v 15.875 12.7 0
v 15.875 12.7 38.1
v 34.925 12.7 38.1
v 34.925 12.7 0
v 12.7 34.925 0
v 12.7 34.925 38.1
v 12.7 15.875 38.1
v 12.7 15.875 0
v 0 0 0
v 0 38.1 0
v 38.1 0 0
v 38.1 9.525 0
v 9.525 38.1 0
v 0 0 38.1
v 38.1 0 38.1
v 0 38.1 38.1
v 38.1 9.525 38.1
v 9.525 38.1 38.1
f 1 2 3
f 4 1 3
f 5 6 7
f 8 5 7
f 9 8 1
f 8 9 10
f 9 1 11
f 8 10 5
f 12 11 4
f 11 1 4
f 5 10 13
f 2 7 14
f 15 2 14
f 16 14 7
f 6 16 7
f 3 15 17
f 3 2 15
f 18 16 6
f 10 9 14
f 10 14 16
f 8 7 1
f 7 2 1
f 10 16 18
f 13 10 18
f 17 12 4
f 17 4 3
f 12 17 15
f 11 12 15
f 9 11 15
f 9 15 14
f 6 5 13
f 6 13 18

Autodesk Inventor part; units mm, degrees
ref_plane "YZ Plane" through (0, 0, 0) normal (1, 0, 0) x (0, 1, 0)
ref_plane "XZ Plane" through (0, 0, 0) normal (0, 1, 0) x (-1, 0, 0)
ref_plane "XY Plane" through (0, 0, 0) normal (0, 0, 1) x (1, 0, 0)
sketch "Sketch1" plane through (0, 0, 0) normal (0, 0, 1) x (1, 0, 0)
  line L0 (0, 0) -> (0, 38.1)
  line L1 (0, 38.1) -> (12.7, 38.1)
  line L2 (12.7, 38.1) -> (12.7, 12.7)
  line L3 (12.7, 12.7) -> (38.1, 12.7)
  line L4 (38.1, 12.7) -> (38.1, 0)
  line L5 (38.1, 0) -> (0, 0)
  dimension "d0" = 38.1
  dimension "d1" = 12.7
  dimension "d2" = 25.4
  dimension "d3" = 25.4
extrude "Extrusion1" add sketch "Sketch1" along normal blind 38.1
chamfer "Chamfer1" distance 3.175 angle 45 1 edges at (12.7, 38.1, 19.05)
chamfer "Chamfer2" distance 3.175 angle 45 2 edges at (12.7, 12.7, 19.05) (38.1, 12.7, 19.05)
properties part number "ChamferPart"
